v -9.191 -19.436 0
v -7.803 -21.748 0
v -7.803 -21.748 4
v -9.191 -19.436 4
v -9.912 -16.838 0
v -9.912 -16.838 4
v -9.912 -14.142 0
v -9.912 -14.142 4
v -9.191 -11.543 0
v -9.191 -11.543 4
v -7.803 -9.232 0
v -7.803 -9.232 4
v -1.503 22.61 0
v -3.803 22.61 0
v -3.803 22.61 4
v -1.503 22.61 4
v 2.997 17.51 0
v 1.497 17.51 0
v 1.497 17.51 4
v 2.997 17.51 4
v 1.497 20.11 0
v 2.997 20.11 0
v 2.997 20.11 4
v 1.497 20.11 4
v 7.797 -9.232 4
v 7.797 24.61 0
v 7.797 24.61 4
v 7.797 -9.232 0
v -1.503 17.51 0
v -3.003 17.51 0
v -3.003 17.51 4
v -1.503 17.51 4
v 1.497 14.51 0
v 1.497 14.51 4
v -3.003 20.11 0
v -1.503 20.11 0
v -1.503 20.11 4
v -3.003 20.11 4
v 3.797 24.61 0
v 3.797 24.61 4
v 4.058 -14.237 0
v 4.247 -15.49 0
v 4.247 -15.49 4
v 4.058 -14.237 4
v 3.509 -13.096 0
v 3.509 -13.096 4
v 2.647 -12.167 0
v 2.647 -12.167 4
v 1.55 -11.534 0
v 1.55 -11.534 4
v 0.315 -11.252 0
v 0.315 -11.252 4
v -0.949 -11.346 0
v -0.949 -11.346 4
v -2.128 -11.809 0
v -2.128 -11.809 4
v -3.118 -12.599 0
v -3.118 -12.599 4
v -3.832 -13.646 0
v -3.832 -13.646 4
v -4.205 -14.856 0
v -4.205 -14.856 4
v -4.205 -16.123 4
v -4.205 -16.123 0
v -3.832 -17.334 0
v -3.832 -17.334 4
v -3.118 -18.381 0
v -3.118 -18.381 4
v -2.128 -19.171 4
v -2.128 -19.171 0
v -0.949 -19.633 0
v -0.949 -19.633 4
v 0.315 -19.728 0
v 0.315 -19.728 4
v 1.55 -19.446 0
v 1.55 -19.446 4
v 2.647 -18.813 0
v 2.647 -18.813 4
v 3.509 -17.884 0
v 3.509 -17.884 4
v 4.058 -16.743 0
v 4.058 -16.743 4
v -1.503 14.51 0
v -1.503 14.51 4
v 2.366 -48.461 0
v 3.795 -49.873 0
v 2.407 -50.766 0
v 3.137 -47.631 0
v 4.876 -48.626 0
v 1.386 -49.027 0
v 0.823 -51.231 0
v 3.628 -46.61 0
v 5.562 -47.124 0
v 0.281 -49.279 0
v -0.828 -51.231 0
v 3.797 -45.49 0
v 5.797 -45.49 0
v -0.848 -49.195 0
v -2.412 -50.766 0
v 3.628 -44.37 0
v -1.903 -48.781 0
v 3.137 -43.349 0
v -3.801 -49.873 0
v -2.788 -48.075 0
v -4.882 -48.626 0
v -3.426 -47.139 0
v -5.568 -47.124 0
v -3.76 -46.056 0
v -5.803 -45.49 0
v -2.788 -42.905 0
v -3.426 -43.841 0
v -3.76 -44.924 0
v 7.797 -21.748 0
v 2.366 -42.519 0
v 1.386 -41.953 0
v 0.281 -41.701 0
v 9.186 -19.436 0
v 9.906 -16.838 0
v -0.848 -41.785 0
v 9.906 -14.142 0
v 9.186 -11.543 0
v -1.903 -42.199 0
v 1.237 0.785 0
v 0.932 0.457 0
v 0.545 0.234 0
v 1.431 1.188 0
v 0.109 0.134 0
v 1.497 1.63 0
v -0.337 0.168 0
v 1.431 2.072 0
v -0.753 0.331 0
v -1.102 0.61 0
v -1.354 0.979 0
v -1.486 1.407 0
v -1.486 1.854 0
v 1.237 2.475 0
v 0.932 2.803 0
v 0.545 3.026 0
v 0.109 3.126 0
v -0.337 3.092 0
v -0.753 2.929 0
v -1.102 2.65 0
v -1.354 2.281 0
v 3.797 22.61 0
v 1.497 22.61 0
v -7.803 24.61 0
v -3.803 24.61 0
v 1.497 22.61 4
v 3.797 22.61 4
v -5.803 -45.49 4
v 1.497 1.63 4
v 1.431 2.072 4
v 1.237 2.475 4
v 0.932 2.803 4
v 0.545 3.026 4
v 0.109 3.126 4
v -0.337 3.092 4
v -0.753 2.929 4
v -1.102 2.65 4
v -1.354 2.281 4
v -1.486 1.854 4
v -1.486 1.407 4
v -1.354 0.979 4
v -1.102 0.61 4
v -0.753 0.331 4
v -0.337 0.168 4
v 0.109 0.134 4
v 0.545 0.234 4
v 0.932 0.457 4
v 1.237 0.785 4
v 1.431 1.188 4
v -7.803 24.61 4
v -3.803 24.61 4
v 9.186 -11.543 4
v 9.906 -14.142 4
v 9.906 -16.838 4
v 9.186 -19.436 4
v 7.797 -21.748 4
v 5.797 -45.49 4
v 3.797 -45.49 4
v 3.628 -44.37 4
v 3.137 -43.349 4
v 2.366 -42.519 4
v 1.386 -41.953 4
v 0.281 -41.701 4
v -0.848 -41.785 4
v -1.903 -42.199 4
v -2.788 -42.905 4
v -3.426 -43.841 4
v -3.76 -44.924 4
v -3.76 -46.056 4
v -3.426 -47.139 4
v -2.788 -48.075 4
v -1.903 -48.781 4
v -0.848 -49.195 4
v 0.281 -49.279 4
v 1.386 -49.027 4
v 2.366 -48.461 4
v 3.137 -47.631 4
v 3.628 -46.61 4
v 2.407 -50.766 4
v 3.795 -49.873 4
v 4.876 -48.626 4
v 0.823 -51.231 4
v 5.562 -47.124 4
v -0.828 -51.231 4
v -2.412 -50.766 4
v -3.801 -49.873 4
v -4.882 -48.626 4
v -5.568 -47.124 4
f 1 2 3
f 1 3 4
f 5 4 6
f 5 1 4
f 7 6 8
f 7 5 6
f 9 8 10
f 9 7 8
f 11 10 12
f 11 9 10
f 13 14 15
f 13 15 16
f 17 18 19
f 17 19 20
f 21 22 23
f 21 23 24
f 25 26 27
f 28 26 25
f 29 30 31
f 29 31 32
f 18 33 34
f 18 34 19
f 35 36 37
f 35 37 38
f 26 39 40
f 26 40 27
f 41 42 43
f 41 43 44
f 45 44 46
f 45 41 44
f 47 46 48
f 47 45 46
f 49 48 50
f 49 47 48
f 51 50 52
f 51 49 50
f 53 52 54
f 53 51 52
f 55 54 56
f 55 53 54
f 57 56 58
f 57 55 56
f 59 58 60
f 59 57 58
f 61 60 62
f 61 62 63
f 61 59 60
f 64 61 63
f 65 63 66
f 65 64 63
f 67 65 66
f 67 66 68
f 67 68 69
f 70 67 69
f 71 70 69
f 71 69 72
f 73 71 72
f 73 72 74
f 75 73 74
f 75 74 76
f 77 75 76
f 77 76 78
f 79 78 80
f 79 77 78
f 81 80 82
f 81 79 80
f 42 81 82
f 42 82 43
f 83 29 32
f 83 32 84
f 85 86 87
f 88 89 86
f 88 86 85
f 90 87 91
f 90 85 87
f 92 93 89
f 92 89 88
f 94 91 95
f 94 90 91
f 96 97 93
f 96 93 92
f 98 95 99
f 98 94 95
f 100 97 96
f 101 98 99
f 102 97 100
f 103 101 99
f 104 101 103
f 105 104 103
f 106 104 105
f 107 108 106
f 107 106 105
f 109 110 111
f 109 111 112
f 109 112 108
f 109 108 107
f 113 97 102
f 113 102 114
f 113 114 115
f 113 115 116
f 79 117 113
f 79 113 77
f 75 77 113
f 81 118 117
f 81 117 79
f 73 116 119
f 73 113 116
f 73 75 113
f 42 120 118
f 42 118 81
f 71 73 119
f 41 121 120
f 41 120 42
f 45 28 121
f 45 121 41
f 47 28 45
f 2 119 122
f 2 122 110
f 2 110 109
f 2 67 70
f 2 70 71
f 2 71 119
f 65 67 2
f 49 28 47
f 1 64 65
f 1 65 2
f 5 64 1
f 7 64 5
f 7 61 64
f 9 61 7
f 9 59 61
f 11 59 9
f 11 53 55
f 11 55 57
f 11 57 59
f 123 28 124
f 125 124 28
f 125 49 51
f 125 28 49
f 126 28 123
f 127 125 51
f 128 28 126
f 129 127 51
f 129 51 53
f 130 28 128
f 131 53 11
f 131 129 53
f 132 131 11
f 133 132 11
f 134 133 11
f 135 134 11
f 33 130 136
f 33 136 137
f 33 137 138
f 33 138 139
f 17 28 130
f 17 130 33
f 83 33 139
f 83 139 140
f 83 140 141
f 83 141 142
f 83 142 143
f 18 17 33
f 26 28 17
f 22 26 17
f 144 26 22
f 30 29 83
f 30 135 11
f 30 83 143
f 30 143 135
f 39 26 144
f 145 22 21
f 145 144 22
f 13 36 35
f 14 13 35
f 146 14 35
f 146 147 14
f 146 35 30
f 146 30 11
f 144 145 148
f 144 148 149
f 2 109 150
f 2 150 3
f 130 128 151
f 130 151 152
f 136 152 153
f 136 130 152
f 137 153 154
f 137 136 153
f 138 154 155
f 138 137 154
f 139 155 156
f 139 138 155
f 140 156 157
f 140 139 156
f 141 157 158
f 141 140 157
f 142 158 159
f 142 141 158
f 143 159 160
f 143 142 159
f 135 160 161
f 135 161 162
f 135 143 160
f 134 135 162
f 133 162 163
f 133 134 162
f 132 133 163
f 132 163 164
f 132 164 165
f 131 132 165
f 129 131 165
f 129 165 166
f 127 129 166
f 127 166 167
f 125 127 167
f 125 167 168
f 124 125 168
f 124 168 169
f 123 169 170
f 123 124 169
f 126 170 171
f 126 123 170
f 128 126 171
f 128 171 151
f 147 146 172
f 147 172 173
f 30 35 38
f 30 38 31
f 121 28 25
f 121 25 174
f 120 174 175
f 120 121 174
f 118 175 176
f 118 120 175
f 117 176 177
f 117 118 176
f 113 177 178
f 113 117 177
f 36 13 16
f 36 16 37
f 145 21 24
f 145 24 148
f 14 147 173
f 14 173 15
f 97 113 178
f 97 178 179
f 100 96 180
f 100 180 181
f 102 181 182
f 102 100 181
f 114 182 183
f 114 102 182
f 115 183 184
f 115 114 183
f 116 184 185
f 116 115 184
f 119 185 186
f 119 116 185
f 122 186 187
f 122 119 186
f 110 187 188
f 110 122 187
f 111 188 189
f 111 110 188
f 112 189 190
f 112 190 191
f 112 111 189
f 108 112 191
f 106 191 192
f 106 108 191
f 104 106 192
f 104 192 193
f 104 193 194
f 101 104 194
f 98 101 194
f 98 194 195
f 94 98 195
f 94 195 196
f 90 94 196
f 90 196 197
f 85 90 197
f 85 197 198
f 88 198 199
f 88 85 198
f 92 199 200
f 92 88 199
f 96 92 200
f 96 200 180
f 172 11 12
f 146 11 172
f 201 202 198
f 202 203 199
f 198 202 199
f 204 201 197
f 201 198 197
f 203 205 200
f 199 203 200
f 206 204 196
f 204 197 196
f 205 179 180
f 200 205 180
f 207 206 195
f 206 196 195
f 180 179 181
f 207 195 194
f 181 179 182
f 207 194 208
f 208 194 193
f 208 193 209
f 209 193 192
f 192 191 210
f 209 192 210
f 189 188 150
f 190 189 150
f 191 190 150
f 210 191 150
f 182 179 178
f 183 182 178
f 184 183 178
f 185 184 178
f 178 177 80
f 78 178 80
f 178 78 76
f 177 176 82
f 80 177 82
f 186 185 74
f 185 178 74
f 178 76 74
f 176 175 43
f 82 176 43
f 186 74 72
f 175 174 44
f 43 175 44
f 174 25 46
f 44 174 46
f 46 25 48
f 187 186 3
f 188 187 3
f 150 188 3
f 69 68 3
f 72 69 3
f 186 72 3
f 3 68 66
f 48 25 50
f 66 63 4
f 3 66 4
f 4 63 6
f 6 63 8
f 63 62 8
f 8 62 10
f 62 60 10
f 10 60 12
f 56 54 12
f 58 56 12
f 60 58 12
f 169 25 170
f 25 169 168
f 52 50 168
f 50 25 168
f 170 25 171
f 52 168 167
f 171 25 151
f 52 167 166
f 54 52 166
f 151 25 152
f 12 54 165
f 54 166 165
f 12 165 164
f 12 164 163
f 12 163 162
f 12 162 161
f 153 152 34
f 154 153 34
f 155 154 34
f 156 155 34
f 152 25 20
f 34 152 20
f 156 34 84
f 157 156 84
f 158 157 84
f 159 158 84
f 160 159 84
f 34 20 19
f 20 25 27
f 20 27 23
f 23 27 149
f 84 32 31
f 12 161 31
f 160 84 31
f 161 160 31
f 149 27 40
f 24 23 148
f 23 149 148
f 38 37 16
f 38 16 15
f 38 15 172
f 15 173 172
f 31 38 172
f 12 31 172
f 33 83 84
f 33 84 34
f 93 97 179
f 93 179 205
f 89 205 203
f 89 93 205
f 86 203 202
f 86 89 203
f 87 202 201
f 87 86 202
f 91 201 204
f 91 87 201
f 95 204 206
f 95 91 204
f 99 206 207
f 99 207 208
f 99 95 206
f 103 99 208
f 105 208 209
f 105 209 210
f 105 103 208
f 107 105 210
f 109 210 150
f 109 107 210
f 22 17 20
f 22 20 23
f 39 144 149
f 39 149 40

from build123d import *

# Parameters (mm, degrees)
SKETCH_1_R      = 4.25
SKETCH_1_R_2    = 3.8
SKETCH_1_R_3    = 1.5
EXTRUDE_1_DEPTH = 4


with BuildPart() as part:
    # 草图1 → 凸台-拉伸1 (new body)
    with BuildSketch(Plane.XY):
        with BuildLine():
            Line((1.497207067, 22.610079684), (3.797207067, 22.610079684))
            Line((3.797207067, 22.610079684), (3.797207067, 24.610079684))
            Line((3.797207067, 24.610079684), (7.797207067, 24.610079684))
            Line((7.797207067, 24.610079684), (7.797207067, -9.232125177))
            ThreePointArc((7.797207067, -9.232125177), (9.997207067, -15.489920316), (7.797207067, -21.747715455))
            Line((7.797207067, -21.747715455), (5.797207067, -45.489920316))
            ThreePointArc((5.797207067, -45.489920316), (-0.002792933, -51.289920316), (-5.802792933, -45.489920316))
            Line((-5.802792933, -45.489920316), (-7.802792933, -21.747715455))
            ThreePointArc((-7.802792933, -21.747715455), (-10.002792933, -15.489920316), (-7.802792933, -9.232125177))
            Line((-7.802792933, -9.232125177), (-7.802792933, 24.610079684))
            Line((-7.802792933, 24.610079684), (-3.802792933, 24.610079684))
            Line((-3.802792933, 24.610079684), (-3.802792933, 22.610079684))
            Line((-3.802792933, 22.610079684), (-1.502792933, 22.610079684))
            Line((-1.502792933, 22.610079684), (-1.502792933, 20.110079684))
            Line((-1.502792933, 20.110079684), (-3.002792933, 20.110079684))
            Line((-3.002792933, 20.110079684), (-3.002792933, 17.510079684))
            Line((-3.002792933, 17.510079684), (-1.502792933, 17.510079684))
            Line((-1.502792933, 17.510079684), (-1.502792933, 14.510079684))
            Line((-1.502792933, 14.510079684), (1.497207067, 14.510079684))
            Line((1.497207067, 14.510079684), (1.497207067, 17.510079684))
            Line((1.497207067, 17.510079684), (2.997207067, 17.510079684))
            Line((2.997207067, 17.510079684), (2.997207067, 20.110079684))
            Line((2.997207067, 20.110079684), (1.497207067, 20.110079684))
            Line((1.497207067, 20.110079684), (1.497207067, 22.610079684))
        make_face()
        with Locations((-0.002792933, -15.489920316)):
            Circle(SKETCH_1_R, mode=Mode.SUBTRACT)
        with Locations((-0.002792933, -45.489920316)):
            Circle(SKETCH_1_R_2, mode=Mode.SUBTRACT)
        with Locations((-0.002792933, 1.630079684)):
            Circle(SKETCH_1_R_3, mode=Mode.SUBTRACT)
    extrude(amount=EXTRUDE_1_DEPTH)


solid = part.part
